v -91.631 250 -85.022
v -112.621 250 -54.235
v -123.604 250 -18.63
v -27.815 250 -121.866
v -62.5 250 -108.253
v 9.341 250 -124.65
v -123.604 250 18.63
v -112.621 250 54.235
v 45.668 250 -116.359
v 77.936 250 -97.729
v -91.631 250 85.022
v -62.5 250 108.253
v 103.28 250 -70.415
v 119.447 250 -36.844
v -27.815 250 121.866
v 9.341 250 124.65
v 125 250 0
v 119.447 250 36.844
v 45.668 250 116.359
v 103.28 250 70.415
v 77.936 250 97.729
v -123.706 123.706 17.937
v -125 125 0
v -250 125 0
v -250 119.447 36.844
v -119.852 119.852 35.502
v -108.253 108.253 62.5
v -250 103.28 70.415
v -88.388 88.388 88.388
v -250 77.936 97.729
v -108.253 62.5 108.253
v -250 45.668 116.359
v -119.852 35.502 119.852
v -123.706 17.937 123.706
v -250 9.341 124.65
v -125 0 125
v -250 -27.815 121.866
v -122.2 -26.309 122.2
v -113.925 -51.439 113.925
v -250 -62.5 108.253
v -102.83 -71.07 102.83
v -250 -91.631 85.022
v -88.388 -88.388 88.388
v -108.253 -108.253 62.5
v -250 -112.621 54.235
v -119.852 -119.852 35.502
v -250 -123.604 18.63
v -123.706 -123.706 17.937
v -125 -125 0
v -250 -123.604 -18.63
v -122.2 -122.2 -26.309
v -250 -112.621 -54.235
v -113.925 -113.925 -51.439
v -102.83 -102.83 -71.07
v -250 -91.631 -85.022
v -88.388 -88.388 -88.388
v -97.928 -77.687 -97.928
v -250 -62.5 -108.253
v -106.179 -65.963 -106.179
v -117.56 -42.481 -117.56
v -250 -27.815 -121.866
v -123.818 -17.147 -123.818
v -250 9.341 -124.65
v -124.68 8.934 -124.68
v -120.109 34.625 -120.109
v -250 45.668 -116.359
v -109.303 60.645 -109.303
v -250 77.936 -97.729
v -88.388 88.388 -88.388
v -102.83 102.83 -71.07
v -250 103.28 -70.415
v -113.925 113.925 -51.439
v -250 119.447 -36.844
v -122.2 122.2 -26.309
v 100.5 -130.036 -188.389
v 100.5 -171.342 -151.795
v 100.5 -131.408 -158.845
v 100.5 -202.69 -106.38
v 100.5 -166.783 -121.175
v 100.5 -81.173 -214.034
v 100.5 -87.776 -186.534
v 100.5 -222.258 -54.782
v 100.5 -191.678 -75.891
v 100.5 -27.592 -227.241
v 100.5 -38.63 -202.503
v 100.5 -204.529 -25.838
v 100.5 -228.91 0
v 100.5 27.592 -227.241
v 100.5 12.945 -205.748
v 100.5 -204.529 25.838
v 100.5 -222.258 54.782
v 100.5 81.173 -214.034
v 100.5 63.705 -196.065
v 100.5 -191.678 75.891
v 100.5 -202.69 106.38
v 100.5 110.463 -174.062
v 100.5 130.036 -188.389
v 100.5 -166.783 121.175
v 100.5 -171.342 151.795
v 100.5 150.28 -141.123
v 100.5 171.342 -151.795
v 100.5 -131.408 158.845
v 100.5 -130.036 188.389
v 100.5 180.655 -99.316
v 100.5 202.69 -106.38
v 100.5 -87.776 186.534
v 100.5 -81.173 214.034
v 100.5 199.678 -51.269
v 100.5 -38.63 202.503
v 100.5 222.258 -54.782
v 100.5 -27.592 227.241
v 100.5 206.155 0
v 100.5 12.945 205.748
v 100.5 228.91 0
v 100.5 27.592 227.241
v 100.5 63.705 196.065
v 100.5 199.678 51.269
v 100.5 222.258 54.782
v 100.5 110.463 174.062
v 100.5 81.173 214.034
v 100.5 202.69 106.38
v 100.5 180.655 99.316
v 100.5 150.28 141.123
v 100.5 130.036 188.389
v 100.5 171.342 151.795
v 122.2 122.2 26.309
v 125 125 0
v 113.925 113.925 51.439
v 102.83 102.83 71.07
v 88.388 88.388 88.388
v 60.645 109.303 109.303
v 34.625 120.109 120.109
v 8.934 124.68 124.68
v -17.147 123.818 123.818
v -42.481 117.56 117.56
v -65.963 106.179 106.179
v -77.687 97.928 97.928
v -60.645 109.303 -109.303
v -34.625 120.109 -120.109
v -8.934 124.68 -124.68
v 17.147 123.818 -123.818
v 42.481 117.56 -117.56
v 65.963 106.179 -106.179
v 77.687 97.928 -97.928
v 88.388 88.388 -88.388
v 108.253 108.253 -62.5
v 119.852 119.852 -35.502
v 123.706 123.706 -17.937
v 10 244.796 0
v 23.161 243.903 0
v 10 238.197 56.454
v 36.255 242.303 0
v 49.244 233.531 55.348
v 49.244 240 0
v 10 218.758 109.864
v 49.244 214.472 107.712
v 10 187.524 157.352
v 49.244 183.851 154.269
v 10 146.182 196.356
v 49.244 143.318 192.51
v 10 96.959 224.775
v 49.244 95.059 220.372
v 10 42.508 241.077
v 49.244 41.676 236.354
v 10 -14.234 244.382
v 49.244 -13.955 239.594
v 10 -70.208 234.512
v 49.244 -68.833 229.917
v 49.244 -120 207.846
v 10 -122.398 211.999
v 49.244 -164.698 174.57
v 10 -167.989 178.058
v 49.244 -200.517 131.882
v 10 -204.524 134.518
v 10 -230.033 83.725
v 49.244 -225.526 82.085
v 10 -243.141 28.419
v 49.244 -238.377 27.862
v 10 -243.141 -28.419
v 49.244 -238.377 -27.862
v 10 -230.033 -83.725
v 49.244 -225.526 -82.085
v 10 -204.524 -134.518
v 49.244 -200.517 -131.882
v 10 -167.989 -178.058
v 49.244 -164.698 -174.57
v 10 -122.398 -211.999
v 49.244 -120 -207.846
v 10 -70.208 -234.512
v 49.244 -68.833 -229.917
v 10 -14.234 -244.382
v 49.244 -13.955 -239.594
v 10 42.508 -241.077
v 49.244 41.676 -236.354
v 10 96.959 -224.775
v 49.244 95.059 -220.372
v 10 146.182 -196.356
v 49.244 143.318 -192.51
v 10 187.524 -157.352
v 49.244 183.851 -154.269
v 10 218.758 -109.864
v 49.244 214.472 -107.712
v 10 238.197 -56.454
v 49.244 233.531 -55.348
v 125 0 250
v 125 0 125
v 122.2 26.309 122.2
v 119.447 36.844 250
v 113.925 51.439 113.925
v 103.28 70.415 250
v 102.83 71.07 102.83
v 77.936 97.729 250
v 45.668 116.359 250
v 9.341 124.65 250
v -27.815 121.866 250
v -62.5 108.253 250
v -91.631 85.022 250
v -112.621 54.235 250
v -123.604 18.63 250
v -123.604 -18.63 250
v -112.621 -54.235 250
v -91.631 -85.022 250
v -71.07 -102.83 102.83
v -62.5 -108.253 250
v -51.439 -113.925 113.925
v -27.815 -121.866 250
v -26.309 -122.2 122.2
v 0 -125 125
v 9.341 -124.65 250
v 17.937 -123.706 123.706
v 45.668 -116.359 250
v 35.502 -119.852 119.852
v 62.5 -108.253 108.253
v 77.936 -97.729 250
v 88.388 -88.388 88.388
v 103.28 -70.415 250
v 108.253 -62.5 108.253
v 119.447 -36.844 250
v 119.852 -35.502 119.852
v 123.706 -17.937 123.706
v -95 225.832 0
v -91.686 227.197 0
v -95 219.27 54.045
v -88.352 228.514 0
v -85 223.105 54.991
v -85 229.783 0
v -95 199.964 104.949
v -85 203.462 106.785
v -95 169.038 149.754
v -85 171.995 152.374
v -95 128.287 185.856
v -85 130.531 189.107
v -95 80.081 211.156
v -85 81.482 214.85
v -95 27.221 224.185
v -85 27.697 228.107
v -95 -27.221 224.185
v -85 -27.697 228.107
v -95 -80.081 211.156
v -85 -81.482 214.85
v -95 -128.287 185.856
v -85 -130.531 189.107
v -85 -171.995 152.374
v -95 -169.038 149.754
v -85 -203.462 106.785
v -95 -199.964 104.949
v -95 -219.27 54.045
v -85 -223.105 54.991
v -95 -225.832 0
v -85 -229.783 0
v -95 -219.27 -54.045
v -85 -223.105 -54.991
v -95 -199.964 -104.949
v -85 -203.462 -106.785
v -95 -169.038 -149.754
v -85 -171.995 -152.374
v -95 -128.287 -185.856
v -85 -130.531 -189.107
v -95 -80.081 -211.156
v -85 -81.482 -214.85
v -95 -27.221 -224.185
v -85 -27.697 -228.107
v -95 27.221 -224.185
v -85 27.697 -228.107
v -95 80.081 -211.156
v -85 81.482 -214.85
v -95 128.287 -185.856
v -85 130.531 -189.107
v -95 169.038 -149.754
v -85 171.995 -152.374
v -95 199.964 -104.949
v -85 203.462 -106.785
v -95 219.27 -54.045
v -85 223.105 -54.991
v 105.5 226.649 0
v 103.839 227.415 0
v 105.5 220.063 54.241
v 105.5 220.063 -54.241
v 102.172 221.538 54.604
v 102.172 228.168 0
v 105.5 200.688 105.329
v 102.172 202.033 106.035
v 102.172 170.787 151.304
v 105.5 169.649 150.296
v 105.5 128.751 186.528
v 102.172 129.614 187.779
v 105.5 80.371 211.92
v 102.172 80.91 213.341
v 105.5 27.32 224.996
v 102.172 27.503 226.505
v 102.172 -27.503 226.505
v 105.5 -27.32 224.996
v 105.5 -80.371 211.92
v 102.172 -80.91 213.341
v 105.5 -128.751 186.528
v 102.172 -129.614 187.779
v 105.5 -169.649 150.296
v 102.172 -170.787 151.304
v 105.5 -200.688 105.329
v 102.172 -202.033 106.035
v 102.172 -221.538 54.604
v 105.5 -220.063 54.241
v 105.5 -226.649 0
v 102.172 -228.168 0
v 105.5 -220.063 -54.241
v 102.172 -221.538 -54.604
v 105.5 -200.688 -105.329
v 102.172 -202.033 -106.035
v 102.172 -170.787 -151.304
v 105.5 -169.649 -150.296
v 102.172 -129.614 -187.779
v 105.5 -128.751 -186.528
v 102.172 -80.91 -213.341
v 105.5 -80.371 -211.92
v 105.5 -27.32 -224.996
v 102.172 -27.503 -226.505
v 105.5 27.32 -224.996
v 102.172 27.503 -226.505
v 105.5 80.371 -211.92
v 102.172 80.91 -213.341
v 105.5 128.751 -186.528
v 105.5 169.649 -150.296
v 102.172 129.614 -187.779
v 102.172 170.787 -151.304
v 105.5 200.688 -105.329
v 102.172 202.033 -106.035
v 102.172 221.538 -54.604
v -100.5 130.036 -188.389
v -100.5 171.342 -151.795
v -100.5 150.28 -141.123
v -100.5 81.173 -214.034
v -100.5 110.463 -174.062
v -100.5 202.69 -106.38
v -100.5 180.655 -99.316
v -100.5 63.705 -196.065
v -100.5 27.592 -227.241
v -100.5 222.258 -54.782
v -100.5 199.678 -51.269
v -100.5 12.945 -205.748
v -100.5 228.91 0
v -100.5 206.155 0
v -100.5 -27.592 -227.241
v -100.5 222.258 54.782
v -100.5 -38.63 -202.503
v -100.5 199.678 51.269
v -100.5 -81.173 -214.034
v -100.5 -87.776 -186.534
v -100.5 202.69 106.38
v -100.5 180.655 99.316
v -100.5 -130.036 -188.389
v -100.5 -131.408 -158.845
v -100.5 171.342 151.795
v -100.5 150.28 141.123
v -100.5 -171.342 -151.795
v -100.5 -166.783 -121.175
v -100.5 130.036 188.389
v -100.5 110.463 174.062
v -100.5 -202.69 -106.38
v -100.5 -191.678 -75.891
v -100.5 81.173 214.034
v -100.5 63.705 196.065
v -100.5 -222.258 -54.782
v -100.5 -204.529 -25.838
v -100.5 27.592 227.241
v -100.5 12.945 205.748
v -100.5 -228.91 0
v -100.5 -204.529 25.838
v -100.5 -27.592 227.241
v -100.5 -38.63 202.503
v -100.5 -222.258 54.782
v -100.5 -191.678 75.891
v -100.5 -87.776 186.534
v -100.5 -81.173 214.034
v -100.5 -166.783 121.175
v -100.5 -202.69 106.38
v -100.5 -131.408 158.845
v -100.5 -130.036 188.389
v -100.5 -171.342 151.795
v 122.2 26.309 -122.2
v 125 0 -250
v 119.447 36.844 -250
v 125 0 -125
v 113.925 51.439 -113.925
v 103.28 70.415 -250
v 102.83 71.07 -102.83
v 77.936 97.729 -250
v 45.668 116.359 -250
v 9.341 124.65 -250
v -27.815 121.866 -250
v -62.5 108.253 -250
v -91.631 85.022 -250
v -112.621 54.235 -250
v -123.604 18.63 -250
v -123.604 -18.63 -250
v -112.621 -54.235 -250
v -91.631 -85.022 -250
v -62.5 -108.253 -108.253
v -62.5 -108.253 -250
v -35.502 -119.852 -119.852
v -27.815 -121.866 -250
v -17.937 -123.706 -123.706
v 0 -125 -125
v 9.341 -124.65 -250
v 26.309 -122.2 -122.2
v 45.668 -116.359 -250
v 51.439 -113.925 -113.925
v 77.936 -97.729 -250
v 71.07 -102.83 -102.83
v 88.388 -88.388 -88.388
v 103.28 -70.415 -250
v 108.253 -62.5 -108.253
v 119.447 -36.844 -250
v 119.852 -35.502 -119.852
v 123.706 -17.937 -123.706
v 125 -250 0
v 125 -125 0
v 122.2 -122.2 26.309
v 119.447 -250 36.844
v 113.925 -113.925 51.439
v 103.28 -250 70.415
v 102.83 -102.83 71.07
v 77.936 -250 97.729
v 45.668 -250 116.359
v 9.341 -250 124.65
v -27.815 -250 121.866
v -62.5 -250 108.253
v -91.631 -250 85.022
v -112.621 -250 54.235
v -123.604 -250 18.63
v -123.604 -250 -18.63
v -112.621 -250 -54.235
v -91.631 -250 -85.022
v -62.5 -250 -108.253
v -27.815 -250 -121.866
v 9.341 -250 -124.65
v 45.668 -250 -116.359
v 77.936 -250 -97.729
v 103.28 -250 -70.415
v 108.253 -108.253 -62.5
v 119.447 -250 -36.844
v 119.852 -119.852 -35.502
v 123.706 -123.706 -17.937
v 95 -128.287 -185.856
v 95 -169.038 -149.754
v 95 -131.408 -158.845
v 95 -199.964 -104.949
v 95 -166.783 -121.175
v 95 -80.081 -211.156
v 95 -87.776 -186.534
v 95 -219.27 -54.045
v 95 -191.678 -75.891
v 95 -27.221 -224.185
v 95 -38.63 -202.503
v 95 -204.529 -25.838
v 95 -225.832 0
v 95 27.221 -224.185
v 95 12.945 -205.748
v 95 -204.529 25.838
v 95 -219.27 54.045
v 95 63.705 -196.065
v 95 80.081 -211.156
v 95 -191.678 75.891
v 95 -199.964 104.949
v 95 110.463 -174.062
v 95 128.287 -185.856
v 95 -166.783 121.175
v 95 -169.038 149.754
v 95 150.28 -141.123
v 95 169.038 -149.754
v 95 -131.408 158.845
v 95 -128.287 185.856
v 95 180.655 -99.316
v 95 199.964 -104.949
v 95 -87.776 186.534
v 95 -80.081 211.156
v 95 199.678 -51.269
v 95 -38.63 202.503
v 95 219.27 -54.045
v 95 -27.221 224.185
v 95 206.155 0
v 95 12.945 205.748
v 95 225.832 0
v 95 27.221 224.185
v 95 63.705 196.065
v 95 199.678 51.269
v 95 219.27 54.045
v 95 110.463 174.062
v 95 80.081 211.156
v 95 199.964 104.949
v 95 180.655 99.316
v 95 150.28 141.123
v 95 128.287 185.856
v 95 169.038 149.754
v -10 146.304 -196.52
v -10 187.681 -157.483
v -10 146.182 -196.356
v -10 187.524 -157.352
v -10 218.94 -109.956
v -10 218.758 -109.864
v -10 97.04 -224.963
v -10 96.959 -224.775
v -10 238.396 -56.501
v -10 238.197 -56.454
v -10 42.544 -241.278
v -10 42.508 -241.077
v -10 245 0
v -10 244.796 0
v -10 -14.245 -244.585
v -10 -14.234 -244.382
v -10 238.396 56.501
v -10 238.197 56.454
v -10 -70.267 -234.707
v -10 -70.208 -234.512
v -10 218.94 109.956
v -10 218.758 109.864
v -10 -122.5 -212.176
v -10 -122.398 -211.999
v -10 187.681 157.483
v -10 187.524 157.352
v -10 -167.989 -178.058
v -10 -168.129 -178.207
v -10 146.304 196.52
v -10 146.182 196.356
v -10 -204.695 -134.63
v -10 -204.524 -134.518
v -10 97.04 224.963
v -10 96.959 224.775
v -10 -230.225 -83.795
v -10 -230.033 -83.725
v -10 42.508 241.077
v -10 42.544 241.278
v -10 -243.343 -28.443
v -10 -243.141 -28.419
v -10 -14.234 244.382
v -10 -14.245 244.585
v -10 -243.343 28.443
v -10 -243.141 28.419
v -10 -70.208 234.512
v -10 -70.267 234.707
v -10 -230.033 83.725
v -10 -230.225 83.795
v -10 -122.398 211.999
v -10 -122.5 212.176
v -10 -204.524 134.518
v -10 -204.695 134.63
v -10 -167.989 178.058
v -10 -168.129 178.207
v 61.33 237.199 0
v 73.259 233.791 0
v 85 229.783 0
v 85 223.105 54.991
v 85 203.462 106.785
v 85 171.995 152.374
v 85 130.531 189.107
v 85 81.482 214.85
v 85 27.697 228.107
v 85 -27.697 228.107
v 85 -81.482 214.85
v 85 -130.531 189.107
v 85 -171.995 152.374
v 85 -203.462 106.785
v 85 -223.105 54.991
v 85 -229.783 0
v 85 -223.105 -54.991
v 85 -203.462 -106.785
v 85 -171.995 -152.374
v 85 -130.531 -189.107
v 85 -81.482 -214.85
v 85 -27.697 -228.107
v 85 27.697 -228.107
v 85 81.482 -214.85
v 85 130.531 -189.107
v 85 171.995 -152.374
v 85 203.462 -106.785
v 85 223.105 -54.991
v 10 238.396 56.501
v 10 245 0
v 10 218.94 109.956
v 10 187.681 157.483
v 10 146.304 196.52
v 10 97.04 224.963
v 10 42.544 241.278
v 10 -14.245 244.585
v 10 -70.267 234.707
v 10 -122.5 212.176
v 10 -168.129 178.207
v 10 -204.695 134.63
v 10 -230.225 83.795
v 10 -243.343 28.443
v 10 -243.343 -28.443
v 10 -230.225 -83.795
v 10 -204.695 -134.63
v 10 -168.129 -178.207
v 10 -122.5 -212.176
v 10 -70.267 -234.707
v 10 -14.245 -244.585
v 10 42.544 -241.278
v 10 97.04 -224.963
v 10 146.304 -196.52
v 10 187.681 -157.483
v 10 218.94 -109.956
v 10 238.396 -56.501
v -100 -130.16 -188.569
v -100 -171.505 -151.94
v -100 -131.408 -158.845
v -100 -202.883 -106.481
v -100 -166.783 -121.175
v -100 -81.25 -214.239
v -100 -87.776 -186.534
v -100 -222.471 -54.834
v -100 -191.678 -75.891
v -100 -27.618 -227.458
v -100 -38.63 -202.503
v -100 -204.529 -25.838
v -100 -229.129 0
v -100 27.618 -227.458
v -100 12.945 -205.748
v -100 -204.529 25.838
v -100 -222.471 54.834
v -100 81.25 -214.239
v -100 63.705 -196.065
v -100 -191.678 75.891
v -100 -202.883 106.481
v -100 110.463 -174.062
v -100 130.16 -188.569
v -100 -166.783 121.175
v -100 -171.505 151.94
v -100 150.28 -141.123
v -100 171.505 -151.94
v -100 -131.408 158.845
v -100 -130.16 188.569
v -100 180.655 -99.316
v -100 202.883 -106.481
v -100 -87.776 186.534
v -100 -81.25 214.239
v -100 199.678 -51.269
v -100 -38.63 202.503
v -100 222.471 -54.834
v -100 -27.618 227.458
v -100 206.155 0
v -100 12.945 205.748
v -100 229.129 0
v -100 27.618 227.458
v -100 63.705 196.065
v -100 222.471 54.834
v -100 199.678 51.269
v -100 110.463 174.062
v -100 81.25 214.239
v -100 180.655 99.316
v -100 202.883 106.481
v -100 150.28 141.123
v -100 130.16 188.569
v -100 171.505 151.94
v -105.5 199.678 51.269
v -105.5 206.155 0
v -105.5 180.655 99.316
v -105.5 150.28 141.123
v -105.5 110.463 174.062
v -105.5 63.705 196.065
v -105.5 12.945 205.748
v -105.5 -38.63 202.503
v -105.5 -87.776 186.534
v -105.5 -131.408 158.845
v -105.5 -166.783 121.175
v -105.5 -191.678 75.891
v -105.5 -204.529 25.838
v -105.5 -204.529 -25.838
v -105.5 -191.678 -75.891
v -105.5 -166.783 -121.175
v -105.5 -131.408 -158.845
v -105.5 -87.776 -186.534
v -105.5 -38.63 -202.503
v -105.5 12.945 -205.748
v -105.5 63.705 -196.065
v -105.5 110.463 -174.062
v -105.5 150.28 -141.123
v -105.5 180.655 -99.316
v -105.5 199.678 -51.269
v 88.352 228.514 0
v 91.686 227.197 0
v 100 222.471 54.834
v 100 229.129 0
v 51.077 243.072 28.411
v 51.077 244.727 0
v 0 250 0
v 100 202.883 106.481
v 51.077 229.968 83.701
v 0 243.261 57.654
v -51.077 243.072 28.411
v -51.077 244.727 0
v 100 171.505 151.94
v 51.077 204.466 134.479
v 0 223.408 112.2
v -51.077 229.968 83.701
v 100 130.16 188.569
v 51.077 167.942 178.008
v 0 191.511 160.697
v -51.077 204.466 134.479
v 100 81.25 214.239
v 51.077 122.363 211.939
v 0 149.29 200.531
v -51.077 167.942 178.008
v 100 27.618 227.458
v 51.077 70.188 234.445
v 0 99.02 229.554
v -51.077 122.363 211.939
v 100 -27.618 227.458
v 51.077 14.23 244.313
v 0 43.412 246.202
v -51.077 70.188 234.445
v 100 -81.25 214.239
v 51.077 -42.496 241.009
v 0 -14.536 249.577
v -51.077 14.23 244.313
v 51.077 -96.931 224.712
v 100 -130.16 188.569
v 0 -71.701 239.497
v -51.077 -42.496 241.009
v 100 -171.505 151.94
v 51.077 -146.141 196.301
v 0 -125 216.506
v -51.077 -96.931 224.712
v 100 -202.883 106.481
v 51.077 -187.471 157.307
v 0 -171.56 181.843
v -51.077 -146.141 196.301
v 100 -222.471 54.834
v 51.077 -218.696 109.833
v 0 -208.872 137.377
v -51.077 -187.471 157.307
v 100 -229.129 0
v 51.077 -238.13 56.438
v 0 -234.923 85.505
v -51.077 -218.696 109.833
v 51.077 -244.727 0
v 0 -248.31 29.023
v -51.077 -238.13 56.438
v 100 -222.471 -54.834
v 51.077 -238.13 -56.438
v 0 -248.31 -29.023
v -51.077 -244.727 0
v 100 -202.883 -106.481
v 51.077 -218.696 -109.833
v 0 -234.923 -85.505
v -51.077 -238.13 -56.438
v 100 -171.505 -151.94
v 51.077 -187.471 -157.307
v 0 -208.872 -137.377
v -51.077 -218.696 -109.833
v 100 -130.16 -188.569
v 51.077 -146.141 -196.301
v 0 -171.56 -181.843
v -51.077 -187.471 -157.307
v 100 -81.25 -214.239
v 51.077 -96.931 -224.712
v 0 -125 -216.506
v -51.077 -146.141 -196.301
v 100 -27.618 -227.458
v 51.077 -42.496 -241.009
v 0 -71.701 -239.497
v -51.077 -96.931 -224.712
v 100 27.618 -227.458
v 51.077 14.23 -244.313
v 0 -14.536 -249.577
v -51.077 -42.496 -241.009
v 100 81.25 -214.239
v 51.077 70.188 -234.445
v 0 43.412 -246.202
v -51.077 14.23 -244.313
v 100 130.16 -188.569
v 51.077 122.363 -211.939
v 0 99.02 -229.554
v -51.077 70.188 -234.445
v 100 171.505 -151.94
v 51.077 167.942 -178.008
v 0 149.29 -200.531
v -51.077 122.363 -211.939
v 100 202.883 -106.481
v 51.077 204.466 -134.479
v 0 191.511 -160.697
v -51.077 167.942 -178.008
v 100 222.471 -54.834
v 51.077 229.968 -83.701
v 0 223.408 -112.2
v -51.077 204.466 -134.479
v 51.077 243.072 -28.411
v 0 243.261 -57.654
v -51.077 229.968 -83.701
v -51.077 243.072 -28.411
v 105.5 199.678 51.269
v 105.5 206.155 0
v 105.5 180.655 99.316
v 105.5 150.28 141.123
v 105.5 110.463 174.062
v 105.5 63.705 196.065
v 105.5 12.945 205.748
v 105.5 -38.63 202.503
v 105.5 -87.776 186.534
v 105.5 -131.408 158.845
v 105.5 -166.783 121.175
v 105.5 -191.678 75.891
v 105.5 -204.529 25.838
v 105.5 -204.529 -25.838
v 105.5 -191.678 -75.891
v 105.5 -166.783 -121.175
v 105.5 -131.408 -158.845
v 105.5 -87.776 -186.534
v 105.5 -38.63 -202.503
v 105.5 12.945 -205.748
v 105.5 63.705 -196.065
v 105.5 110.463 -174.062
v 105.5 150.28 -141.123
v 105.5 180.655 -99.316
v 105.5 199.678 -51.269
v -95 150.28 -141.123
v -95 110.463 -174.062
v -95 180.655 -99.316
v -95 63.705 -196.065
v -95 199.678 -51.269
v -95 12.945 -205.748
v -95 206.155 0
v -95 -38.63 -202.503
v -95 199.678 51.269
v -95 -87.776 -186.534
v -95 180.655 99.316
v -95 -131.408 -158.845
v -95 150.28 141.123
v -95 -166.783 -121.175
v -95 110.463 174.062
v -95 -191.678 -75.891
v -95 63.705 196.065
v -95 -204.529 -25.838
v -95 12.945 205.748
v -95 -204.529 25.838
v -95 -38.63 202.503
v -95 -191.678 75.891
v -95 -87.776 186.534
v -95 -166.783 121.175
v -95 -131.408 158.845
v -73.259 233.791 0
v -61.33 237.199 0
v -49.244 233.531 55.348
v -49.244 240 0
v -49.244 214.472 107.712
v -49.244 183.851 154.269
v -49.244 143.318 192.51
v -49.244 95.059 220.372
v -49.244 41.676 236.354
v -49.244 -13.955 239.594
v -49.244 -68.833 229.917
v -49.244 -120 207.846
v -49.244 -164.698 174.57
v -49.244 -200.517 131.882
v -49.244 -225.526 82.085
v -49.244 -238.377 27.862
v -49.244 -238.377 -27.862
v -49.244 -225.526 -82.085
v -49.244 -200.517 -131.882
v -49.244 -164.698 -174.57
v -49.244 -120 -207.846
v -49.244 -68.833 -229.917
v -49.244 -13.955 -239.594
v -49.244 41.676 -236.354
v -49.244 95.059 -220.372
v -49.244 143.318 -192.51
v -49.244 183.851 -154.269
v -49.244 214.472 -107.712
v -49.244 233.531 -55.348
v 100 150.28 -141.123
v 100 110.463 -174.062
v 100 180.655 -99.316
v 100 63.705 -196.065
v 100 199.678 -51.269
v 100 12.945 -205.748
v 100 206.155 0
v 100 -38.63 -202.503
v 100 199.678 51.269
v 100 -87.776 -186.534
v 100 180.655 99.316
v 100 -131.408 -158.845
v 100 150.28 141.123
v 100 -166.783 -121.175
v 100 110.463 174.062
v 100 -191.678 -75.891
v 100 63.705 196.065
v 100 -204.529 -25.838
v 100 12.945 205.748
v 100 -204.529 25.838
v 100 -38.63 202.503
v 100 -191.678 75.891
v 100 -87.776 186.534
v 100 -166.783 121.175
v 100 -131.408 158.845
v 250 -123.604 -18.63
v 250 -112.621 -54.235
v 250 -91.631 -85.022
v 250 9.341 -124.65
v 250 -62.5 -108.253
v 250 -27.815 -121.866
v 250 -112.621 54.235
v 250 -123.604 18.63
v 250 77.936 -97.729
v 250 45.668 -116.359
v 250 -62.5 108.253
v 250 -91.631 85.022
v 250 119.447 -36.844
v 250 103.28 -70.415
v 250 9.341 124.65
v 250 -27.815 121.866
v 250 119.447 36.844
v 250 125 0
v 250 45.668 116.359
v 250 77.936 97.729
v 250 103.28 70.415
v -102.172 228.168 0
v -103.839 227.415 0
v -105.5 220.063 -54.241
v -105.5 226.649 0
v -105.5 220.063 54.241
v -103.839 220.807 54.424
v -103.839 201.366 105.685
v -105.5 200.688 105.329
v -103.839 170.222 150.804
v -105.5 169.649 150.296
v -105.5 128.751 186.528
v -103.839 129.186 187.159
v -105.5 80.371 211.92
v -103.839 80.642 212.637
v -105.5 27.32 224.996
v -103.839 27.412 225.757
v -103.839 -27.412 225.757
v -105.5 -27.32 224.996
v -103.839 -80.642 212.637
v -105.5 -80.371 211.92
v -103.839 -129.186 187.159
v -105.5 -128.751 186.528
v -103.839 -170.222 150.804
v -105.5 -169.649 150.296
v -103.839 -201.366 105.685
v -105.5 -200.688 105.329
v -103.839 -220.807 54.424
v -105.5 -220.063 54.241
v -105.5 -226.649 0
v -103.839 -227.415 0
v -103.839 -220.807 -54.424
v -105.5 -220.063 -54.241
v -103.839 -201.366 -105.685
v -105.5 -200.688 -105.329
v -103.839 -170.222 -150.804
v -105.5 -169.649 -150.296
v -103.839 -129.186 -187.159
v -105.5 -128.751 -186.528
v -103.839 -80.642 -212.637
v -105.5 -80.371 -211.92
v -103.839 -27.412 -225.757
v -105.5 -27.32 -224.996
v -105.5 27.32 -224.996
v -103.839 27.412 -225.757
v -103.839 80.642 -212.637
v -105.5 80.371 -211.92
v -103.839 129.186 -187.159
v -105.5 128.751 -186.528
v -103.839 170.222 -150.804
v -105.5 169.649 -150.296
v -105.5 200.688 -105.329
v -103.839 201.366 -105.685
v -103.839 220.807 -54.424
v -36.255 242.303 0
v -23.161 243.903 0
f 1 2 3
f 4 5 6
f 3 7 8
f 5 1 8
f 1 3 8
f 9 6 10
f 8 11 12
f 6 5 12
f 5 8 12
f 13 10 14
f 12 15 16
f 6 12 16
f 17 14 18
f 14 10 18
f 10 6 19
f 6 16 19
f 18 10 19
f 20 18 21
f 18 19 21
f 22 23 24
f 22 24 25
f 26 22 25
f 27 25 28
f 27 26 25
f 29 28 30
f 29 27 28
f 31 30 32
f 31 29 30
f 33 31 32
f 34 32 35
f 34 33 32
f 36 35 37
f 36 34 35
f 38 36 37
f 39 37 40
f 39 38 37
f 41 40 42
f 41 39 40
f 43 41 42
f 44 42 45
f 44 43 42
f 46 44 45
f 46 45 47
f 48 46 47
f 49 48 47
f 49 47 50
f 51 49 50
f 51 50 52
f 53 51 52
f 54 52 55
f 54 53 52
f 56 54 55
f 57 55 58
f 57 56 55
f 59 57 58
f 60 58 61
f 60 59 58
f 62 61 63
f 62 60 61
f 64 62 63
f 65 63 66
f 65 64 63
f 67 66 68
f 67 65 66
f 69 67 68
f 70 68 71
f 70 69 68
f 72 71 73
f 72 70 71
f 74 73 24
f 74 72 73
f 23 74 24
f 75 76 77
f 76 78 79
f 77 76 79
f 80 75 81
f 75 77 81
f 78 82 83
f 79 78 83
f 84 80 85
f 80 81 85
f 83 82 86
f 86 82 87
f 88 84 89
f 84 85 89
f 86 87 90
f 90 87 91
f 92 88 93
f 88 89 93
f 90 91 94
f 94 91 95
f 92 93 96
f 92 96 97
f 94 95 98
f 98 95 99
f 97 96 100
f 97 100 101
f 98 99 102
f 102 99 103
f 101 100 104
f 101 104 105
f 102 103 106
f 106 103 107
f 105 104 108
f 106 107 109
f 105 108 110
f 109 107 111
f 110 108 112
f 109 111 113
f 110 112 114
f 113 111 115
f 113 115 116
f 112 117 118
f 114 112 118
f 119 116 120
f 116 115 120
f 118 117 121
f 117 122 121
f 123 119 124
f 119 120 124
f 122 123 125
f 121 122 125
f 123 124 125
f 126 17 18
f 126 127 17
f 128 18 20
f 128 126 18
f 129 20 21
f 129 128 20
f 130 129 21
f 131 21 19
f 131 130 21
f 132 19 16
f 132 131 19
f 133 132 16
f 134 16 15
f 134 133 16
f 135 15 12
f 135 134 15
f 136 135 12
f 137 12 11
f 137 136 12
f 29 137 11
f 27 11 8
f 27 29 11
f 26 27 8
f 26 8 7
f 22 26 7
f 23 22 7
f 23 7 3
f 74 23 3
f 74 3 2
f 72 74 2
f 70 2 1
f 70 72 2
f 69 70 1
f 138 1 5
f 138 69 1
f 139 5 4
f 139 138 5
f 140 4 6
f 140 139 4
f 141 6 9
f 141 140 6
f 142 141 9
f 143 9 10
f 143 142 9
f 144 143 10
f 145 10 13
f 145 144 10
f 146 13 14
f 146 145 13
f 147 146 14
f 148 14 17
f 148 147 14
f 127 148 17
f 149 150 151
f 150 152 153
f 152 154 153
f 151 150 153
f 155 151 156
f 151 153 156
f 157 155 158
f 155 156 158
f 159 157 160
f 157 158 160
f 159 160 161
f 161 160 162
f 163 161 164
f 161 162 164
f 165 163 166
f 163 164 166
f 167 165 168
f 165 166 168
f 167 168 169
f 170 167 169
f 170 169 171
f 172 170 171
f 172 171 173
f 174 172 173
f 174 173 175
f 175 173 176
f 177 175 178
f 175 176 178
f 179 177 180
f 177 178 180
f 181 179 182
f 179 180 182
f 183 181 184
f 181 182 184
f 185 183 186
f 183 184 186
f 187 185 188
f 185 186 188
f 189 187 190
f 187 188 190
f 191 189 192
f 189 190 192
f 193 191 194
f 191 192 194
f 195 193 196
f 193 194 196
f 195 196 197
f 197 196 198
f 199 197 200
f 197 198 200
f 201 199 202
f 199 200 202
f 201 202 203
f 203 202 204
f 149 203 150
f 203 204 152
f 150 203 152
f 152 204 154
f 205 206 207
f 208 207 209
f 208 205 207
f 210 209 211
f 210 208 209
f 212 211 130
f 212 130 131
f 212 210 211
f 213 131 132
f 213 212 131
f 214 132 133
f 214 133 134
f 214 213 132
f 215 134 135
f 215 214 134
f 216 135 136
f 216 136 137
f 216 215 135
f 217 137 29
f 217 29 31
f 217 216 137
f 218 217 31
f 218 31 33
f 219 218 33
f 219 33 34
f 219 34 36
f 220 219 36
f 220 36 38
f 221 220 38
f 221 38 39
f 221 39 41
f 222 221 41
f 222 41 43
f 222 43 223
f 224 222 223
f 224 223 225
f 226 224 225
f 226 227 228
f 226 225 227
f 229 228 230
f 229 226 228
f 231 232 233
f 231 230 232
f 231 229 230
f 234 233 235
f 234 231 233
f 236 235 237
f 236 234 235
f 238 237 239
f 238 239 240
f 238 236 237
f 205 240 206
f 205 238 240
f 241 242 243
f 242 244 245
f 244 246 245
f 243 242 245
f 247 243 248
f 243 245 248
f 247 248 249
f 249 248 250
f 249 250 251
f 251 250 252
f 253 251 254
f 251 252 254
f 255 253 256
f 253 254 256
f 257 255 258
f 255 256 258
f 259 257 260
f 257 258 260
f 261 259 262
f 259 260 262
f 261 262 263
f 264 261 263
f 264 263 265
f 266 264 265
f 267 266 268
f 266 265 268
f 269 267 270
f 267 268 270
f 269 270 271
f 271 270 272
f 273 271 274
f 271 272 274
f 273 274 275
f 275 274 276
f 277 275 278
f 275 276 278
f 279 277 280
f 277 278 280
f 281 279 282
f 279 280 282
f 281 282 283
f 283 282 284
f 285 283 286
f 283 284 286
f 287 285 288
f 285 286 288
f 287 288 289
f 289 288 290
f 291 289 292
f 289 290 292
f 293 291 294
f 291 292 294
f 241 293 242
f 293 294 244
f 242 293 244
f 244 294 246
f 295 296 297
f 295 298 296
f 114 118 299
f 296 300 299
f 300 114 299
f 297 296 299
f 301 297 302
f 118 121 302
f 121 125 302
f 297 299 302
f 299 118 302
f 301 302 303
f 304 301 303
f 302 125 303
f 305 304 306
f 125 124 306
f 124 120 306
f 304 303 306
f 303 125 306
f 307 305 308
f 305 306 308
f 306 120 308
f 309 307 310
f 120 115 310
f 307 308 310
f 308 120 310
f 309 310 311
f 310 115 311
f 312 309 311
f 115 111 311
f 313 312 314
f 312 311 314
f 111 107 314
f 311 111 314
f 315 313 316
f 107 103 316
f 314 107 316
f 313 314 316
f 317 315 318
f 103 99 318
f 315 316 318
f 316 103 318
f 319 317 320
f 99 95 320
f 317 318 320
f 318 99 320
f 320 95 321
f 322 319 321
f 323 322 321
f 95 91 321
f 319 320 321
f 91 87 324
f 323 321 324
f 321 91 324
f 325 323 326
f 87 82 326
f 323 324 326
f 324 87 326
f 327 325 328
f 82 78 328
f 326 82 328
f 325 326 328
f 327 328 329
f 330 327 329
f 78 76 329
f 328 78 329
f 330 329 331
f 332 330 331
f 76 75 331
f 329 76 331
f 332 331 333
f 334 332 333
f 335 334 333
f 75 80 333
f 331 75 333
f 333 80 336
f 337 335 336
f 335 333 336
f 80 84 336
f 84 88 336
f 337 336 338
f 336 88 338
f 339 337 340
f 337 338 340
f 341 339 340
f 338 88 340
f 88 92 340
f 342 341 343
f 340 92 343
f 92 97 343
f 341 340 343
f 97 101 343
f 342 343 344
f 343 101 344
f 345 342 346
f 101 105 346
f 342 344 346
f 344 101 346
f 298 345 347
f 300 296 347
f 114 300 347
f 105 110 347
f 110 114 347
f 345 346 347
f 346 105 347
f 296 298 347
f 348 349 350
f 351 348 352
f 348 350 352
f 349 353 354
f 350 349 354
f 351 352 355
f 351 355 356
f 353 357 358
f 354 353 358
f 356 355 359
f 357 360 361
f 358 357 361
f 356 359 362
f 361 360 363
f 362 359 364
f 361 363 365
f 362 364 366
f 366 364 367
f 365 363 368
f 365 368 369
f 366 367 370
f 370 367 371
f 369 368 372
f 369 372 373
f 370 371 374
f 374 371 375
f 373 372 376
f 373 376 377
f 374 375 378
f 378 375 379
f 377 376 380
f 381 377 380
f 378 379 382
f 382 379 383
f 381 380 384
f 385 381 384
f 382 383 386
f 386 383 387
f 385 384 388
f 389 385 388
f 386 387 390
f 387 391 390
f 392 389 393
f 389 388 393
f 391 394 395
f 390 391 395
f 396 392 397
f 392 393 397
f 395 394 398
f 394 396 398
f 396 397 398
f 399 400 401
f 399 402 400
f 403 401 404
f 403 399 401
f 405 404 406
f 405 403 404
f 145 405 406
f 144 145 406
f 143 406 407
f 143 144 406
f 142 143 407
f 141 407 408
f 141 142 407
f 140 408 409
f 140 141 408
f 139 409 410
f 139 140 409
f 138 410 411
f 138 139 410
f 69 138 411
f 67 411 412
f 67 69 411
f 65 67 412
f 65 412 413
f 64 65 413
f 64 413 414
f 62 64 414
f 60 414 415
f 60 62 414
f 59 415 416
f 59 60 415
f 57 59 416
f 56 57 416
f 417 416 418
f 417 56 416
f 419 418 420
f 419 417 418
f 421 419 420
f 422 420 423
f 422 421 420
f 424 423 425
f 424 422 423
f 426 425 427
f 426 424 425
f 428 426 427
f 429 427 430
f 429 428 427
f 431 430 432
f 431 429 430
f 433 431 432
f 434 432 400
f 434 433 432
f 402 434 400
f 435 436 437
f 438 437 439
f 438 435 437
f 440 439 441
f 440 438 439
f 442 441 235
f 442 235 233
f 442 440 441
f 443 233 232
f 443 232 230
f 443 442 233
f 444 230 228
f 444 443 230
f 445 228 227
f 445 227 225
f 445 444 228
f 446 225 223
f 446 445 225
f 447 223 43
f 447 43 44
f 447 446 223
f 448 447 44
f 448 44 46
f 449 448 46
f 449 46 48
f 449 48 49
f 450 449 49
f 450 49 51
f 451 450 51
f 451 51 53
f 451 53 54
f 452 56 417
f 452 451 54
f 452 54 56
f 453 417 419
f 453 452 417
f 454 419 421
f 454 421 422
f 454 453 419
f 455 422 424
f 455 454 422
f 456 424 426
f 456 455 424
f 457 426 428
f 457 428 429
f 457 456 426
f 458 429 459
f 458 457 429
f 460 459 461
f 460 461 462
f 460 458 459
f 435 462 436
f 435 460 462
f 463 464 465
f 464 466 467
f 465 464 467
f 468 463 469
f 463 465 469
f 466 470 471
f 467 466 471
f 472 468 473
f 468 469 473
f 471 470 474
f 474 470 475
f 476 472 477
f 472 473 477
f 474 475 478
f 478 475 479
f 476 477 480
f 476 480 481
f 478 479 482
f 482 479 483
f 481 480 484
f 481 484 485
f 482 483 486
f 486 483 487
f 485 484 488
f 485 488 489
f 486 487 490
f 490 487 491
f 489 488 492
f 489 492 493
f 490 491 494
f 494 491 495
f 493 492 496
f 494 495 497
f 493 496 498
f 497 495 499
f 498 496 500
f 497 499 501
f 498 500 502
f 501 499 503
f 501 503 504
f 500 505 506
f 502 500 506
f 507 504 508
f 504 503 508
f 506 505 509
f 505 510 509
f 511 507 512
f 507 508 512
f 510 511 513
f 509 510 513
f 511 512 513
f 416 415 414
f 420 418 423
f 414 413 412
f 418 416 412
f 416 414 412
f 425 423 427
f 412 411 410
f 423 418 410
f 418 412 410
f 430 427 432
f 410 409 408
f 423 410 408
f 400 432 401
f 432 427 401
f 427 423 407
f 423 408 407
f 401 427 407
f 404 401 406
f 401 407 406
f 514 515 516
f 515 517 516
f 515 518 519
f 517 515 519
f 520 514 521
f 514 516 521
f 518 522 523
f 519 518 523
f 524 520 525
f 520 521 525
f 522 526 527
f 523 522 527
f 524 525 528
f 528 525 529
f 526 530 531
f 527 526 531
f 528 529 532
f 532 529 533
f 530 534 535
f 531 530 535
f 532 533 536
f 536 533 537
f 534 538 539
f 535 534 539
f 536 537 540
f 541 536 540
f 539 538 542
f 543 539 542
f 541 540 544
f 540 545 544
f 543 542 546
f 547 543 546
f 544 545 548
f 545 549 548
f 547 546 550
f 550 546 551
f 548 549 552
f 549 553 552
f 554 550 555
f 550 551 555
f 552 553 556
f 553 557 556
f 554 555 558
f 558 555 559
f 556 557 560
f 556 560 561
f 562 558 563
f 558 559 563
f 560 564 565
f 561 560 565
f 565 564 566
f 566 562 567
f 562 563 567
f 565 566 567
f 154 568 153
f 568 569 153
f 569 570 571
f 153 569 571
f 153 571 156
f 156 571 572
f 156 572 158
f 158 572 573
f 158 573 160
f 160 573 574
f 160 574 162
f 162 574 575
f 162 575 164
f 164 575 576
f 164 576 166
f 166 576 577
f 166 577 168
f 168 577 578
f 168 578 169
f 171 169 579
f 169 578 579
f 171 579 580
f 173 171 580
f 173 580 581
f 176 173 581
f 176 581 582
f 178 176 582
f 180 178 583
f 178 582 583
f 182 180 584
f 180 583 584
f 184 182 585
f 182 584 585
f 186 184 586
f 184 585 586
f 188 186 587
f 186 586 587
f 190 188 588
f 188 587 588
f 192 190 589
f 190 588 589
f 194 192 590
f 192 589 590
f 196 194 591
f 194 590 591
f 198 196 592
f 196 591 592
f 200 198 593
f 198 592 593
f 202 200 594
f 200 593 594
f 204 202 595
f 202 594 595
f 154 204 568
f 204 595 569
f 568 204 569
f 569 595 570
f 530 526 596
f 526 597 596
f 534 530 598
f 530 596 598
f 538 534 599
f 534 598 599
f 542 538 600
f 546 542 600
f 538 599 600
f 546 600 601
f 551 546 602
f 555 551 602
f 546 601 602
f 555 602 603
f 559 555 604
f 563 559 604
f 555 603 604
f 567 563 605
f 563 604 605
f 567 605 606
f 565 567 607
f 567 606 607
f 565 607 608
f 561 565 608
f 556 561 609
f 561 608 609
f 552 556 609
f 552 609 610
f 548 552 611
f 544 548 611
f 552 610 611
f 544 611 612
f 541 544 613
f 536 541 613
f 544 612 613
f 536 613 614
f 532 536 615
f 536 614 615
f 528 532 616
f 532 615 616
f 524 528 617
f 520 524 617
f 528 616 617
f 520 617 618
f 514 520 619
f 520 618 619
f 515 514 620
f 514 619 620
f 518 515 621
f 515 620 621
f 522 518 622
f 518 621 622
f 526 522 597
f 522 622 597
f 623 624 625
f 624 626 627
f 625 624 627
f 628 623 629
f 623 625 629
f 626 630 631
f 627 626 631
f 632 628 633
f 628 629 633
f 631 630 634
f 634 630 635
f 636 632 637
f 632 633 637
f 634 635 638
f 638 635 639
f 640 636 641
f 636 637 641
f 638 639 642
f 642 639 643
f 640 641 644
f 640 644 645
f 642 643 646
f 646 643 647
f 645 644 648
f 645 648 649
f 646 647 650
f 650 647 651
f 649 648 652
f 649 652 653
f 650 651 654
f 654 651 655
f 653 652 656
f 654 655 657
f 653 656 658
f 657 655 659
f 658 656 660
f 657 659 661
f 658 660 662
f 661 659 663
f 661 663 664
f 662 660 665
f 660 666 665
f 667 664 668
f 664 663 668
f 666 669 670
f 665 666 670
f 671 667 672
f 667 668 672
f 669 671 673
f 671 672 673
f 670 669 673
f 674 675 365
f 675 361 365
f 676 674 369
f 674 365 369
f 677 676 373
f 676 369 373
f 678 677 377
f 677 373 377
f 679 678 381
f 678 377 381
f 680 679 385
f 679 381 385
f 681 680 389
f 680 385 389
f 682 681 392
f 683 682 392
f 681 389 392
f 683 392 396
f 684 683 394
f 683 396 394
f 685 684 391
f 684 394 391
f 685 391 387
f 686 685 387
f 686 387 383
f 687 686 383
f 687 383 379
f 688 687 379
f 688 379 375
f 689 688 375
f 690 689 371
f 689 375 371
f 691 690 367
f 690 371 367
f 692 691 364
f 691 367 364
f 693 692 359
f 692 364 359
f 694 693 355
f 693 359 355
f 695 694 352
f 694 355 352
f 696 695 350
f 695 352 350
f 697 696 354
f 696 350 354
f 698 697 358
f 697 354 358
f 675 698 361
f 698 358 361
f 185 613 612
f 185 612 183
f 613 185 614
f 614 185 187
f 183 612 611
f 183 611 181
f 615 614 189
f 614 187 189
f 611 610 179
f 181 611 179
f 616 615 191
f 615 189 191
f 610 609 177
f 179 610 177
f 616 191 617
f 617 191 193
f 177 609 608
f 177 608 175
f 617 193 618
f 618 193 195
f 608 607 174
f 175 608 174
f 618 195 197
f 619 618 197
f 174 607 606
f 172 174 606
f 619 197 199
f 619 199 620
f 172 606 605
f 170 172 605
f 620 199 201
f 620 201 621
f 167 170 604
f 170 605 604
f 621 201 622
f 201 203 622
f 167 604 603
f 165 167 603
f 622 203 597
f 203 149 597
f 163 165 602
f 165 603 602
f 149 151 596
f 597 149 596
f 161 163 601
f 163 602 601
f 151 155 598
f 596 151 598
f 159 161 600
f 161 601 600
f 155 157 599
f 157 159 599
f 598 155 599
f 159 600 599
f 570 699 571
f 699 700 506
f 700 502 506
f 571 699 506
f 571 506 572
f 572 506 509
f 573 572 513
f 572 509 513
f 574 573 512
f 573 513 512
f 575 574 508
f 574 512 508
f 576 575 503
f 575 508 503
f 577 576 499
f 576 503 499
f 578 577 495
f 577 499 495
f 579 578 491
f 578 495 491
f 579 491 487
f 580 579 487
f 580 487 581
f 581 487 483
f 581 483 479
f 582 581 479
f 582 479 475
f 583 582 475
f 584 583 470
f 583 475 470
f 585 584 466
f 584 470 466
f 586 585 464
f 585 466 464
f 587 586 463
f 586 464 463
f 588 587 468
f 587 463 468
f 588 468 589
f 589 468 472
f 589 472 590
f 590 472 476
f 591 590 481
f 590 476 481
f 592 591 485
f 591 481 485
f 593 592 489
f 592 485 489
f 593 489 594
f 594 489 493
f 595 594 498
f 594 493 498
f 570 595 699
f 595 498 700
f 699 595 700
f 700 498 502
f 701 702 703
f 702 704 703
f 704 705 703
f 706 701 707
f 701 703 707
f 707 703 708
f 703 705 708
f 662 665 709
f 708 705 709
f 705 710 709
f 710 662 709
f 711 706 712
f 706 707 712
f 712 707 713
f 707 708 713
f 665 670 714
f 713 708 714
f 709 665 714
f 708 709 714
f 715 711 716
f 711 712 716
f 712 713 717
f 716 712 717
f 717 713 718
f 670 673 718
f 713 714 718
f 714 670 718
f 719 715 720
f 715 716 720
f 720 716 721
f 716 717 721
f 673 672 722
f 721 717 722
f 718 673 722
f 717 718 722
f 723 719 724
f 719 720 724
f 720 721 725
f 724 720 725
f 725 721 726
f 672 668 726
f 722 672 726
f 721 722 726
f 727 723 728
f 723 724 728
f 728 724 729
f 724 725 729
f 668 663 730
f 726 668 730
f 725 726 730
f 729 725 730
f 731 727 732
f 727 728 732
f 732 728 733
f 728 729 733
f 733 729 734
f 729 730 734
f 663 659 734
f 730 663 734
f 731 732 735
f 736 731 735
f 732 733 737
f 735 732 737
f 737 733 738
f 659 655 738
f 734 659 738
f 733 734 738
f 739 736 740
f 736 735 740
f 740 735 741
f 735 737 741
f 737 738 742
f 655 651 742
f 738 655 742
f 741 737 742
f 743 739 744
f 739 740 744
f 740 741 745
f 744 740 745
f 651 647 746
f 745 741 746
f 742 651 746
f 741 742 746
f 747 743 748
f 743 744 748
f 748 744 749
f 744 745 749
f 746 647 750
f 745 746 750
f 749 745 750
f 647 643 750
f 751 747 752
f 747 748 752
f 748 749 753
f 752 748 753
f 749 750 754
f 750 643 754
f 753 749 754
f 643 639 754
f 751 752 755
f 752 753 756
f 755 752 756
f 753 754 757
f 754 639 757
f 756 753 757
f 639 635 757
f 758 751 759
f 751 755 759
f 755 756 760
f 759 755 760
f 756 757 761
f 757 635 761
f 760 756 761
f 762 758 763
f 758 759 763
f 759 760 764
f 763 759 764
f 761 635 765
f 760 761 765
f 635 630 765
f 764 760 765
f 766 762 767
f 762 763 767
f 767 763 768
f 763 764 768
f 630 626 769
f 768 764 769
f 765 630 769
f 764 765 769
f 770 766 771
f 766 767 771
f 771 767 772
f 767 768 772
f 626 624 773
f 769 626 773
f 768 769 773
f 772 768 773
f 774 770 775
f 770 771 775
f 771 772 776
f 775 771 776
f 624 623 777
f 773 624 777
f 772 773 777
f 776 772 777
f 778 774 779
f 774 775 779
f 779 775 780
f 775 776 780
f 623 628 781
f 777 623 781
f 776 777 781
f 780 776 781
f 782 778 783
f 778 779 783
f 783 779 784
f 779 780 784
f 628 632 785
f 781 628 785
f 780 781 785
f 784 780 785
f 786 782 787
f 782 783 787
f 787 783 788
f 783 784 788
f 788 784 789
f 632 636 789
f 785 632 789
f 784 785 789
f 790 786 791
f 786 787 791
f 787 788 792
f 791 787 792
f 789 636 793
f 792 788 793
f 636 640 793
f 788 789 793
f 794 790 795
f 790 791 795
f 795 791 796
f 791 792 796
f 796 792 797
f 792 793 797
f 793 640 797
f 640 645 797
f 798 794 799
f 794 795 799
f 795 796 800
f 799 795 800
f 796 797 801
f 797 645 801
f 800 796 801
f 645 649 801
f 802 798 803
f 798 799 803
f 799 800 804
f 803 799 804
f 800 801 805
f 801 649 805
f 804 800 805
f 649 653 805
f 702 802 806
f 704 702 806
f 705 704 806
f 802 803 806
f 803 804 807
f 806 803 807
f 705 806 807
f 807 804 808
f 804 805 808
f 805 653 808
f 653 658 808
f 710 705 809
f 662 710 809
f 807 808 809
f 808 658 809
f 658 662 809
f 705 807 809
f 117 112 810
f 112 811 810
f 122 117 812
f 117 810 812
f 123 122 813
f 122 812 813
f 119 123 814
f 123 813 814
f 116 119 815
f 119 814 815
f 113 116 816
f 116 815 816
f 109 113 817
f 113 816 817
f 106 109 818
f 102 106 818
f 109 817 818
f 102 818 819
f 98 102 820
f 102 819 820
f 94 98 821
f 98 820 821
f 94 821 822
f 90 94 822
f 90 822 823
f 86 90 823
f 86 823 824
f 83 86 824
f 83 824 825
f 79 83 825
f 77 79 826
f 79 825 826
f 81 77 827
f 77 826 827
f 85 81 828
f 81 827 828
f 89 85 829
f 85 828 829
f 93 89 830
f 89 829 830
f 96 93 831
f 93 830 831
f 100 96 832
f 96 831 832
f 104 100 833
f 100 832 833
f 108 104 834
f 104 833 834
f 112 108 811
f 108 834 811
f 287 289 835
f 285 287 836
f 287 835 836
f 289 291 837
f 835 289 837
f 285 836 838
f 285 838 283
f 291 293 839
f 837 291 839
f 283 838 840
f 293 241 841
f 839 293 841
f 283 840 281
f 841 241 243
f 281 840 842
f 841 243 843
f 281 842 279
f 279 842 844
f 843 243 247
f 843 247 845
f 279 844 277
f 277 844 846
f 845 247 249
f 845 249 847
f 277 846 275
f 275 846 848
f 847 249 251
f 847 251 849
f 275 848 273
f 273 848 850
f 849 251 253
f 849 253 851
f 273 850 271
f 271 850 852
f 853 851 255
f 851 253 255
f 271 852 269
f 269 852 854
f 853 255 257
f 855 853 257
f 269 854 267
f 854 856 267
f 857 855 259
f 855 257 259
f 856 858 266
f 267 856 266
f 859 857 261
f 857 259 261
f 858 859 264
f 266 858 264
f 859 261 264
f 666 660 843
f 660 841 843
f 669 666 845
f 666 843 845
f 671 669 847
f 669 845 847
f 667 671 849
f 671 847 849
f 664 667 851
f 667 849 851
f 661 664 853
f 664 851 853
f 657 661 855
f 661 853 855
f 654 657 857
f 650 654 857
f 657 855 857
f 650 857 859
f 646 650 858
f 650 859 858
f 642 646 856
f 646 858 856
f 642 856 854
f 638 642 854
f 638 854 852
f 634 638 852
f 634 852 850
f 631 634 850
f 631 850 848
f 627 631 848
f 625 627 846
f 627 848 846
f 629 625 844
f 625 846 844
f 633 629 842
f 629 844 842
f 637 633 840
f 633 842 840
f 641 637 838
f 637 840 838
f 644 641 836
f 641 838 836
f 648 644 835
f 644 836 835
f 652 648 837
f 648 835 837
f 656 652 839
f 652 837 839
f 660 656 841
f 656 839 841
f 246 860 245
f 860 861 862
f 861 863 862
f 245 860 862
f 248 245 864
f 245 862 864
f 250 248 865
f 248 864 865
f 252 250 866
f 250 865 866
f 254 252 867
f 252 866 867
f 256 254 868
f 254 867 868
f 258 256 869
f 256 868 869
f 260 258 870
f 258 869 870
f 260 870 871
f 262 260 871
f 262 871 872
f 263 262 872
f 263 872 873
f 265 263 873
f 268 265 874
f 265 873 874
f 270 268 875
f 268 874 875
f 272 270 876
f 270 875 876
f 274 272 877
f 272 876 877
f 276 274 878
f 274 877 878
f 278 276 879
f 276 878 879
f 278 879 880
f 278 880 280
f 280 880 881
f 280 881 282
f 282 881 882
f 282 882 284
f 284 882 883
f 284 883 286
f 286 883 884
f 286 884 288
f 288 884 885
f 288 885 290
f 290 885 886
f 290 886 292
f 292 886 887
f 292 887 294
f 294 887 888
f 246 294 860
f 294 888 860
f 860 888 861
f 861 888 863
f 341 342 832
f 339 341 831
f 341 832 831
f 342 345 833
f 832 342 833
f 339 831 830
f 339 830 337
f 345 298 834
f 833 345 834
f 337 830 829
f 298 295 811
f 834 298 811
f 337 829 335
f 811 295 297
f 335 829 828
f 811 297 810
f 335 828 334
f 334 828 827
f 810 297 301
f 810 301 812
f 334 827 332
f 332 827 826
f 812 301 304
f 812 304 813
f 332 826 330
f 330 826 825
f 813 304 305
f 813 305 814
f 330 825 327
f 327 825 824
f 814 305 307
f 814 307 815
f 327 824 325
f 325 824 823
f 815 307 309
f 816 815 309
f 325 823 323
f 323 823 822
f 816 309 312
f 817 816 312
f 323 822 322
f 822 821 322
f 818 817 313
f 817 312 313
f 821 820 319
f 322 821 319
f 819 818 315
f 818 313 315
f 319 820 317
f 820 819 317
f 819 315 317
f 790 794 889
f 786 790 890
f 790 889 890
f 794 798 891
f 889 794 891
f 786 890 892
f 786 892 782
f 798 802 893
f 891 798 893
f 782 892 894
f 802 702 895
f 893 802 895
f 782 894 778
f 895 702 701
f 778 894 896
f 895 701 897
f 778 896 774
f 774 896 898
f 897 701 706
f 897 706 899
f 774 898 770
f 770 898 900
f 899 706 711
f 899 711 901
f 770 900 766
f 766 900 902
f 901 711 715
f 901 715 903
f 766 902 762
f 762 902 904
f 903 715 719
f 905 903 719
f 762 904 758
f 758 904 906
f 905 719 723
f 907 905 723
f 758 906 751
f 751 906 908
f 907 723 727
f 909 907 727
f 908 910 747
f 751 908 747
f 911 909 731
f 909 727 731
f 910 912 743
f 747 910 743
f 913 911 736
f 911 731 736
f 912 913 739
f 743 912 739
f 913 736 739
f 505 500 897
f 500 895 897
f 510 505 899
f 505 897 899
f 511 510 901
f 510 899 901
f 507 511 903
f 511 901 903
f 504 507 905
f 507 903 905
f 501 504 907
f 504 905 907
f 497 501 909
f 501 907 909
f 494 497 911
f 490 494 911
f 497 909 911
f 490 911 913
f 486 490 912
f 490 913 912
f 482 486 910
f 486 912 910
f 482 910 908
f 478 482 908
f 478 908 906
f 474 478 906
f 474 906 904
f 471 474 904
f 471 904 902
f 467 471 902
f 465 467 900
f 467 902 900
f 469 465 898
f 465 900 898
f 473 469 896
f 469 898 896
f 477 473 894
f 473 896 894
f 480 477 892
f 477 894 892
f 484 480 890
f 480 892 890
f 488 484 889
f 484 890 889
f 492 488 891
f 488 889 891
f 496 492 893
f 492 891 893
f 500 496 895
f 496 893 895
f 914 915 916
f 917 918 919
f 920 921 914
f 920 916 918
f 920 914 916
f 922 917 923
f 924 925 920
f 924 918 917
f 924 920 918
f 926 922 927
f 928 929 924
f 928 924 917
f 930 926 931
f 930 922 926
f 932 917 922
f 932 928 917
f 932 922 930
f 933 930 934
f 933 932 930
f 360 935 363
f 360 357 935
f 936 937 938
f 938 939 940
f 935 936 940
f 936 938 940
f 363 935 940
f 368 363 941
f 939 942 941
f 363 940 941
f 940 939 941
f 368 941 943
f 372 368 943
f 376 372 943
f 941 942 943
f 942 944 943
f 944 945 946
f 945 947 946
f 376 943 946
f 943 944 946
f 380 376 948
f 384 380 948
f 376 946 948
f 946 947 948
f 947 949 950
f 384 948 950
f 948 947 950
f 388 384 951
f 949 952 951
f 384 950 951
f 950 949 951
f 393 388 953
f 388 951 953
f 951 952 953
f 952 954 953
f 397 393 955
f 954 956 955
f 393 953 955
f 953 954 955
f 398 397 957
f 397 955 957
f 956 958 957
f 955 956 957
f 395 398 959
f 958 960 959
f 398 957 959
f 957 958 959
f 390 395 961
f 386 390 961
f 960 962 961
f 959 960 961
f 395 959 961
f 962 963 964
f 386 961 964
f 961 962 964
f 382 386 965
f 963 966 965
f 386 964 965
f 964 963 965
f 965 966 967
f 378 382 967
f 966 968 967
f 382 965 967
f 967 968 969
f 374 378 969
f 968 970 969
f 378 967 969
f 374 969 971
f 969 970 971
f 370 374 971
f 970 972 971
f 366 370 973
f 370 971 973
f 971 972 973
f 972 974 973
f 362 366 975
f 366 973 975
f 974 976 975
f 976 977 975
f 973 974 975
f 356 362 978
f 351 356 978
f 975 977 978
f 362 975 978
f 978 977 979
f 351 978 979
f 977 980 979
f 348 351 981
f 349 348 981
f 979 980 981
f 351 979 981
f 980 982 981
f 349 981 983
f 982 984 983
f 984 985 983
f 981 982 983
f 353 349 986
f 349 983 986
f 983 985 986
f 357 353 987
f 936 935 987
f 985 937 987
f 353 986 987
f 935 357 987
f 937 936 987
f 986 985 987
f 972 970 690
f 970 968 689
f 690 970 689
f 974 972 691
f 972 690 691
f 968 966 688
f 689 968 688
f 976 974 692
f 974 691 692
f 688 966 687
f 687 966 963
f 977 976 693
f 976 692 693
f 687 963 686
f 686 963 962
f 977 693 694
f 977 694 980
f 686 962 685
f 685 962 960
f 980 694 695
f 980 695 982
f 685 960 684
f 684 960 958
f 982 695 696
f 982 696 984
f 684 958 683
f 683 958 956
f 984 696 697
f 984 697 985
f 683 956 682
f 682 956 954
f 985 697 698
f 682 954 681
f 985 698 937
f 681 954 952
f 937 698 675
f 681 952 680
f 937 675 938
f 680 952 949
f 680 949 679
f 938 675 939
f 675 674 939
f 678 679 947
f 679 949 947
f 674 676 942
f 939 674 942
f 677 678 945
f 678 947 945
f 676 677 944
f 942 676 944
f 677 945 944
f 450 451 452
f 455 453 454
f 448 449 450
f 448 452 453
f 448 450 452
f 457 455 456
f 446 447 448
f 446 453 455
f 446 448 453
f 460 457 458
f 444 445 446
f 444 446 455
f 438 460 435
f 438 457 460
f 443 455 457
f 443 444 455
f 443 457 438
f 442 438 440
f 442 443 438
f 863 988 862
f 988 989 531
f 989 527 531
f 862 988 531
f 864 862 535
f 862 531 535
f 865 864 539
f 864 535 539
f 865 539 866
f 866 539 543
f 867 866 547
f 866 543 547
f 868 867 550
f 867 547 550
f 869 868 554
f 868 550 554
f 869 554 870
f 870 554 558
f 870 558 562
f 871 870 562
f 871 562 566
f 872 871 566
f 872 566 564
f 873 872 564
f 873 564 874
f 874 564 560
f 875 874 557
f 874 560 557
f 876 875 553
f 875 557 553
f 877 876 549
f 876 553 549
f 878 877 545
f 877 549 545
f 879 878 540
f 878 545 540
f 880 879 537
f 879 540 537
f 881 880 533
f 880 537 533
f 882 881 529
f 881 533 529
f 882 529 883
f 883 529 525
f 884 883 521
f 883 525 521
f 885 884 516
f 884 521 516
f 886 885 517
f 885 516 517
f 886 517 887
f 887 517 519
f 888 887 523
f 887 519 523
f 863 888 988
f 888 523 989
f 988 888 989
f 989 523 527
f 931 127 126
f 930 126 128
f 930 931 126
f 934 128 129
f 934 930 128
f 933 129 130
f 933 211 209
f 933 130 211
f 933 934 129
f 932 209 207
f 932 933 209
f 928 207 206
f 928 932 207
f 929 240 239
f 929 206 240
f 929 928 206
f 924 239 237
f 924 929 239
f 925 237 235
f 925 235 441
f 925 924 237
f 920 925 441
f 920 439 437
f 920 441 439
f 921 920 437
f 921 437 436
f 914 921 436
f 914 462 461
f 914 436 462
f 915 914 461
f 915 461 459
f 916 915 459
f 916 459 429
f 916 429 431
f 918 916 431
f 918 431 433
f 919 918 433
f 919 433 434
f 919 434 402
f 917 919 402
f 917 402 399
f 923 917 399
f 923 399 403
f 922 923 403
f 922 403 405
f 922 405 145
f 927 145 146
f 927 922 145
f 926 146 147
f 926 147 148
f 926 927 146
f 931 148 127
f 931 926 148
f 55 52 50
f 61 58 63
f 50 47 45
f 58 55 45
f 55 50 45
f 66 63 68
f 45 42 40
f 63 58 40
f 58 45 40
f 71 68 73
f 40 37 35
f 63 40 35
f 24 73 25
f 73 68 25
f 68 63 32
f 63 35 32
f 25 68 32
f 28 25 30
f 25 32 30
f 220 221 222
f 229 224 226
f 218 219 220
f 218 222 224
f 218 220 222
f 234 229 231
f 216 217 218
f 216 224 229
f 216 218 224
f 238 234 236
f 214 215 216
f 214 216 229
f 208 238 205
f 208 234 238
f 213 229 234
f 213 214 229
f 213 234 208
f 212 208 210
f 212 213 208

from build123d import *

# Parameters (mm, degrees)
F2_R     = 125
F5_DEPTH = 250
F3_R     = 125
F6_DEPTH = 250
F1_R     = 125
F7_DEPTH = 250


with BuildPart() as f4:
    # F0 (on Top) → F4 (revolve)
    with BuildSketch(Plane.XY):
        with BuildLine():
            Line((-100.5, 206.1547847478), (-100.5, 228.9099167795))
            ThreePointArc((-100.5, 228.9099167795), (-103.0062036193, 227.7931562096), (-105.5, 226.6489576415))
            Line((-105.5, 226.6489576415), (-105.5, 215.5684346095))
            Line((-105.5, 215.5684346095), (-105.5, 206.1547847478))
            Line((-105.5, 206.1547847478), (-100.5, 206.1547847478))
        make_face()
    revolve(axis=Axis((0, 0, 0), (1, 0, 0)))


with BuildPart() as f4b:
    # F0 (on Top) → F4, piece 2 (revolve)
    with BuildSketch(Plane.XY):
        with BuildLine():
            Line((-95, 225), (-95, 225.8317958127))
            ThreePointArc((-95, 225.8317958127), (-90.0216753203, 227.8620152033), (-85, 229.7825058615))
            ThreePointArc((-85, 229.7825058615), (-67.3162801965, 235.5706229998), (-49.244289009, 240))
            ThreePointArc((-49.244289009, 240), (-29.7190418638, 243.1908274395), (-10, 244.7958332979))
            Line((-10, 244.7958332979), (-10, 245))
            Line((-10, 245), (3.458e-07, 245))
            Line((3.458e-07, 245), (10, 245))
            Line((10, 245), (10, 244.7958332979))
            ThreePointArc((10, 244.7958332979), (29.7190418638, 243.1908274395), (49.244289009, 240))
            ThreePointArc((49.244289009, 240), (67.3162801965, 235.5706229998), (85, 229.7825058615))
            ThreePointArc((85, 229.7825058615), (90.0216753203, 227.8620152033), (95, 225.8317958127))
            Line((95, 225.8317958127), (95, 225))
            Line((95, 225), (95, 206.1547847478))
            Line((95, 206.1547847478), (100, 206.1547847478))
            Line((100, 206.1547847478), (100, 229.1287847478))
            ThreePointArc((100, 229.1287847478), (0, 250), (-100, 229.1287847478))
            Line((-100, 229.1287847478), (-100, 206.1547847478))
            Line((-100, 206.1547847478), (-95, 206.1547847478))
            Line((-95, 206.1547847478), (-95, 225))
        make_face()
    revolve(axis=Axis((0, 0, 0), (1, 0, 0)))


with BuildPart() as f4c:
    # F0 (on Top) → F4, piece 3 (revolve)
    with BuildSketch(Plane.XY):
        with BuildLine():
            ThreePointArc((105.5, 226.6489576415), (103.0062036193, 227.7931562096), (100.5, 228.9099167795))
            Line((100.5, 228.9099167795), (100.5, 206.1547847478))
            Line((100.5, 206.1547847478), (105.5, 206.1547847478))
            Line((105.5, 206.1547847478), (105.5, 215.5684346095))
            Line((105.5, 215.5684346095), (105.5, 226.6489576415))
        make_face()
    revolve(axis=Axis((0, 0, 0), (1, 0, 0)))


with BuildPart() as f5:
    # F2 (on Front) → F5 (new body, symmetric)
    with BuildSketch(Plane.XZ):
        Circle(F2_R)
    extrude(amount=F5_DEPTH, both=True)

    # F3 (on Top) → F6 (join, symmetric)
    with BuildSketch(Plane.XY):
        Circle(F3_R)
    extrude(amount=F6_DEPTH, both=True)

    # F1 (on Right) → F7 (join, symmetric)
    with BuildSketch(Plane.YZ):
        Circle(F1_R)
    extrude(amount=F7_DEPTH, both=True)


solid = Compound([f4.part, f4b.part, f4c.part, f5.part])
